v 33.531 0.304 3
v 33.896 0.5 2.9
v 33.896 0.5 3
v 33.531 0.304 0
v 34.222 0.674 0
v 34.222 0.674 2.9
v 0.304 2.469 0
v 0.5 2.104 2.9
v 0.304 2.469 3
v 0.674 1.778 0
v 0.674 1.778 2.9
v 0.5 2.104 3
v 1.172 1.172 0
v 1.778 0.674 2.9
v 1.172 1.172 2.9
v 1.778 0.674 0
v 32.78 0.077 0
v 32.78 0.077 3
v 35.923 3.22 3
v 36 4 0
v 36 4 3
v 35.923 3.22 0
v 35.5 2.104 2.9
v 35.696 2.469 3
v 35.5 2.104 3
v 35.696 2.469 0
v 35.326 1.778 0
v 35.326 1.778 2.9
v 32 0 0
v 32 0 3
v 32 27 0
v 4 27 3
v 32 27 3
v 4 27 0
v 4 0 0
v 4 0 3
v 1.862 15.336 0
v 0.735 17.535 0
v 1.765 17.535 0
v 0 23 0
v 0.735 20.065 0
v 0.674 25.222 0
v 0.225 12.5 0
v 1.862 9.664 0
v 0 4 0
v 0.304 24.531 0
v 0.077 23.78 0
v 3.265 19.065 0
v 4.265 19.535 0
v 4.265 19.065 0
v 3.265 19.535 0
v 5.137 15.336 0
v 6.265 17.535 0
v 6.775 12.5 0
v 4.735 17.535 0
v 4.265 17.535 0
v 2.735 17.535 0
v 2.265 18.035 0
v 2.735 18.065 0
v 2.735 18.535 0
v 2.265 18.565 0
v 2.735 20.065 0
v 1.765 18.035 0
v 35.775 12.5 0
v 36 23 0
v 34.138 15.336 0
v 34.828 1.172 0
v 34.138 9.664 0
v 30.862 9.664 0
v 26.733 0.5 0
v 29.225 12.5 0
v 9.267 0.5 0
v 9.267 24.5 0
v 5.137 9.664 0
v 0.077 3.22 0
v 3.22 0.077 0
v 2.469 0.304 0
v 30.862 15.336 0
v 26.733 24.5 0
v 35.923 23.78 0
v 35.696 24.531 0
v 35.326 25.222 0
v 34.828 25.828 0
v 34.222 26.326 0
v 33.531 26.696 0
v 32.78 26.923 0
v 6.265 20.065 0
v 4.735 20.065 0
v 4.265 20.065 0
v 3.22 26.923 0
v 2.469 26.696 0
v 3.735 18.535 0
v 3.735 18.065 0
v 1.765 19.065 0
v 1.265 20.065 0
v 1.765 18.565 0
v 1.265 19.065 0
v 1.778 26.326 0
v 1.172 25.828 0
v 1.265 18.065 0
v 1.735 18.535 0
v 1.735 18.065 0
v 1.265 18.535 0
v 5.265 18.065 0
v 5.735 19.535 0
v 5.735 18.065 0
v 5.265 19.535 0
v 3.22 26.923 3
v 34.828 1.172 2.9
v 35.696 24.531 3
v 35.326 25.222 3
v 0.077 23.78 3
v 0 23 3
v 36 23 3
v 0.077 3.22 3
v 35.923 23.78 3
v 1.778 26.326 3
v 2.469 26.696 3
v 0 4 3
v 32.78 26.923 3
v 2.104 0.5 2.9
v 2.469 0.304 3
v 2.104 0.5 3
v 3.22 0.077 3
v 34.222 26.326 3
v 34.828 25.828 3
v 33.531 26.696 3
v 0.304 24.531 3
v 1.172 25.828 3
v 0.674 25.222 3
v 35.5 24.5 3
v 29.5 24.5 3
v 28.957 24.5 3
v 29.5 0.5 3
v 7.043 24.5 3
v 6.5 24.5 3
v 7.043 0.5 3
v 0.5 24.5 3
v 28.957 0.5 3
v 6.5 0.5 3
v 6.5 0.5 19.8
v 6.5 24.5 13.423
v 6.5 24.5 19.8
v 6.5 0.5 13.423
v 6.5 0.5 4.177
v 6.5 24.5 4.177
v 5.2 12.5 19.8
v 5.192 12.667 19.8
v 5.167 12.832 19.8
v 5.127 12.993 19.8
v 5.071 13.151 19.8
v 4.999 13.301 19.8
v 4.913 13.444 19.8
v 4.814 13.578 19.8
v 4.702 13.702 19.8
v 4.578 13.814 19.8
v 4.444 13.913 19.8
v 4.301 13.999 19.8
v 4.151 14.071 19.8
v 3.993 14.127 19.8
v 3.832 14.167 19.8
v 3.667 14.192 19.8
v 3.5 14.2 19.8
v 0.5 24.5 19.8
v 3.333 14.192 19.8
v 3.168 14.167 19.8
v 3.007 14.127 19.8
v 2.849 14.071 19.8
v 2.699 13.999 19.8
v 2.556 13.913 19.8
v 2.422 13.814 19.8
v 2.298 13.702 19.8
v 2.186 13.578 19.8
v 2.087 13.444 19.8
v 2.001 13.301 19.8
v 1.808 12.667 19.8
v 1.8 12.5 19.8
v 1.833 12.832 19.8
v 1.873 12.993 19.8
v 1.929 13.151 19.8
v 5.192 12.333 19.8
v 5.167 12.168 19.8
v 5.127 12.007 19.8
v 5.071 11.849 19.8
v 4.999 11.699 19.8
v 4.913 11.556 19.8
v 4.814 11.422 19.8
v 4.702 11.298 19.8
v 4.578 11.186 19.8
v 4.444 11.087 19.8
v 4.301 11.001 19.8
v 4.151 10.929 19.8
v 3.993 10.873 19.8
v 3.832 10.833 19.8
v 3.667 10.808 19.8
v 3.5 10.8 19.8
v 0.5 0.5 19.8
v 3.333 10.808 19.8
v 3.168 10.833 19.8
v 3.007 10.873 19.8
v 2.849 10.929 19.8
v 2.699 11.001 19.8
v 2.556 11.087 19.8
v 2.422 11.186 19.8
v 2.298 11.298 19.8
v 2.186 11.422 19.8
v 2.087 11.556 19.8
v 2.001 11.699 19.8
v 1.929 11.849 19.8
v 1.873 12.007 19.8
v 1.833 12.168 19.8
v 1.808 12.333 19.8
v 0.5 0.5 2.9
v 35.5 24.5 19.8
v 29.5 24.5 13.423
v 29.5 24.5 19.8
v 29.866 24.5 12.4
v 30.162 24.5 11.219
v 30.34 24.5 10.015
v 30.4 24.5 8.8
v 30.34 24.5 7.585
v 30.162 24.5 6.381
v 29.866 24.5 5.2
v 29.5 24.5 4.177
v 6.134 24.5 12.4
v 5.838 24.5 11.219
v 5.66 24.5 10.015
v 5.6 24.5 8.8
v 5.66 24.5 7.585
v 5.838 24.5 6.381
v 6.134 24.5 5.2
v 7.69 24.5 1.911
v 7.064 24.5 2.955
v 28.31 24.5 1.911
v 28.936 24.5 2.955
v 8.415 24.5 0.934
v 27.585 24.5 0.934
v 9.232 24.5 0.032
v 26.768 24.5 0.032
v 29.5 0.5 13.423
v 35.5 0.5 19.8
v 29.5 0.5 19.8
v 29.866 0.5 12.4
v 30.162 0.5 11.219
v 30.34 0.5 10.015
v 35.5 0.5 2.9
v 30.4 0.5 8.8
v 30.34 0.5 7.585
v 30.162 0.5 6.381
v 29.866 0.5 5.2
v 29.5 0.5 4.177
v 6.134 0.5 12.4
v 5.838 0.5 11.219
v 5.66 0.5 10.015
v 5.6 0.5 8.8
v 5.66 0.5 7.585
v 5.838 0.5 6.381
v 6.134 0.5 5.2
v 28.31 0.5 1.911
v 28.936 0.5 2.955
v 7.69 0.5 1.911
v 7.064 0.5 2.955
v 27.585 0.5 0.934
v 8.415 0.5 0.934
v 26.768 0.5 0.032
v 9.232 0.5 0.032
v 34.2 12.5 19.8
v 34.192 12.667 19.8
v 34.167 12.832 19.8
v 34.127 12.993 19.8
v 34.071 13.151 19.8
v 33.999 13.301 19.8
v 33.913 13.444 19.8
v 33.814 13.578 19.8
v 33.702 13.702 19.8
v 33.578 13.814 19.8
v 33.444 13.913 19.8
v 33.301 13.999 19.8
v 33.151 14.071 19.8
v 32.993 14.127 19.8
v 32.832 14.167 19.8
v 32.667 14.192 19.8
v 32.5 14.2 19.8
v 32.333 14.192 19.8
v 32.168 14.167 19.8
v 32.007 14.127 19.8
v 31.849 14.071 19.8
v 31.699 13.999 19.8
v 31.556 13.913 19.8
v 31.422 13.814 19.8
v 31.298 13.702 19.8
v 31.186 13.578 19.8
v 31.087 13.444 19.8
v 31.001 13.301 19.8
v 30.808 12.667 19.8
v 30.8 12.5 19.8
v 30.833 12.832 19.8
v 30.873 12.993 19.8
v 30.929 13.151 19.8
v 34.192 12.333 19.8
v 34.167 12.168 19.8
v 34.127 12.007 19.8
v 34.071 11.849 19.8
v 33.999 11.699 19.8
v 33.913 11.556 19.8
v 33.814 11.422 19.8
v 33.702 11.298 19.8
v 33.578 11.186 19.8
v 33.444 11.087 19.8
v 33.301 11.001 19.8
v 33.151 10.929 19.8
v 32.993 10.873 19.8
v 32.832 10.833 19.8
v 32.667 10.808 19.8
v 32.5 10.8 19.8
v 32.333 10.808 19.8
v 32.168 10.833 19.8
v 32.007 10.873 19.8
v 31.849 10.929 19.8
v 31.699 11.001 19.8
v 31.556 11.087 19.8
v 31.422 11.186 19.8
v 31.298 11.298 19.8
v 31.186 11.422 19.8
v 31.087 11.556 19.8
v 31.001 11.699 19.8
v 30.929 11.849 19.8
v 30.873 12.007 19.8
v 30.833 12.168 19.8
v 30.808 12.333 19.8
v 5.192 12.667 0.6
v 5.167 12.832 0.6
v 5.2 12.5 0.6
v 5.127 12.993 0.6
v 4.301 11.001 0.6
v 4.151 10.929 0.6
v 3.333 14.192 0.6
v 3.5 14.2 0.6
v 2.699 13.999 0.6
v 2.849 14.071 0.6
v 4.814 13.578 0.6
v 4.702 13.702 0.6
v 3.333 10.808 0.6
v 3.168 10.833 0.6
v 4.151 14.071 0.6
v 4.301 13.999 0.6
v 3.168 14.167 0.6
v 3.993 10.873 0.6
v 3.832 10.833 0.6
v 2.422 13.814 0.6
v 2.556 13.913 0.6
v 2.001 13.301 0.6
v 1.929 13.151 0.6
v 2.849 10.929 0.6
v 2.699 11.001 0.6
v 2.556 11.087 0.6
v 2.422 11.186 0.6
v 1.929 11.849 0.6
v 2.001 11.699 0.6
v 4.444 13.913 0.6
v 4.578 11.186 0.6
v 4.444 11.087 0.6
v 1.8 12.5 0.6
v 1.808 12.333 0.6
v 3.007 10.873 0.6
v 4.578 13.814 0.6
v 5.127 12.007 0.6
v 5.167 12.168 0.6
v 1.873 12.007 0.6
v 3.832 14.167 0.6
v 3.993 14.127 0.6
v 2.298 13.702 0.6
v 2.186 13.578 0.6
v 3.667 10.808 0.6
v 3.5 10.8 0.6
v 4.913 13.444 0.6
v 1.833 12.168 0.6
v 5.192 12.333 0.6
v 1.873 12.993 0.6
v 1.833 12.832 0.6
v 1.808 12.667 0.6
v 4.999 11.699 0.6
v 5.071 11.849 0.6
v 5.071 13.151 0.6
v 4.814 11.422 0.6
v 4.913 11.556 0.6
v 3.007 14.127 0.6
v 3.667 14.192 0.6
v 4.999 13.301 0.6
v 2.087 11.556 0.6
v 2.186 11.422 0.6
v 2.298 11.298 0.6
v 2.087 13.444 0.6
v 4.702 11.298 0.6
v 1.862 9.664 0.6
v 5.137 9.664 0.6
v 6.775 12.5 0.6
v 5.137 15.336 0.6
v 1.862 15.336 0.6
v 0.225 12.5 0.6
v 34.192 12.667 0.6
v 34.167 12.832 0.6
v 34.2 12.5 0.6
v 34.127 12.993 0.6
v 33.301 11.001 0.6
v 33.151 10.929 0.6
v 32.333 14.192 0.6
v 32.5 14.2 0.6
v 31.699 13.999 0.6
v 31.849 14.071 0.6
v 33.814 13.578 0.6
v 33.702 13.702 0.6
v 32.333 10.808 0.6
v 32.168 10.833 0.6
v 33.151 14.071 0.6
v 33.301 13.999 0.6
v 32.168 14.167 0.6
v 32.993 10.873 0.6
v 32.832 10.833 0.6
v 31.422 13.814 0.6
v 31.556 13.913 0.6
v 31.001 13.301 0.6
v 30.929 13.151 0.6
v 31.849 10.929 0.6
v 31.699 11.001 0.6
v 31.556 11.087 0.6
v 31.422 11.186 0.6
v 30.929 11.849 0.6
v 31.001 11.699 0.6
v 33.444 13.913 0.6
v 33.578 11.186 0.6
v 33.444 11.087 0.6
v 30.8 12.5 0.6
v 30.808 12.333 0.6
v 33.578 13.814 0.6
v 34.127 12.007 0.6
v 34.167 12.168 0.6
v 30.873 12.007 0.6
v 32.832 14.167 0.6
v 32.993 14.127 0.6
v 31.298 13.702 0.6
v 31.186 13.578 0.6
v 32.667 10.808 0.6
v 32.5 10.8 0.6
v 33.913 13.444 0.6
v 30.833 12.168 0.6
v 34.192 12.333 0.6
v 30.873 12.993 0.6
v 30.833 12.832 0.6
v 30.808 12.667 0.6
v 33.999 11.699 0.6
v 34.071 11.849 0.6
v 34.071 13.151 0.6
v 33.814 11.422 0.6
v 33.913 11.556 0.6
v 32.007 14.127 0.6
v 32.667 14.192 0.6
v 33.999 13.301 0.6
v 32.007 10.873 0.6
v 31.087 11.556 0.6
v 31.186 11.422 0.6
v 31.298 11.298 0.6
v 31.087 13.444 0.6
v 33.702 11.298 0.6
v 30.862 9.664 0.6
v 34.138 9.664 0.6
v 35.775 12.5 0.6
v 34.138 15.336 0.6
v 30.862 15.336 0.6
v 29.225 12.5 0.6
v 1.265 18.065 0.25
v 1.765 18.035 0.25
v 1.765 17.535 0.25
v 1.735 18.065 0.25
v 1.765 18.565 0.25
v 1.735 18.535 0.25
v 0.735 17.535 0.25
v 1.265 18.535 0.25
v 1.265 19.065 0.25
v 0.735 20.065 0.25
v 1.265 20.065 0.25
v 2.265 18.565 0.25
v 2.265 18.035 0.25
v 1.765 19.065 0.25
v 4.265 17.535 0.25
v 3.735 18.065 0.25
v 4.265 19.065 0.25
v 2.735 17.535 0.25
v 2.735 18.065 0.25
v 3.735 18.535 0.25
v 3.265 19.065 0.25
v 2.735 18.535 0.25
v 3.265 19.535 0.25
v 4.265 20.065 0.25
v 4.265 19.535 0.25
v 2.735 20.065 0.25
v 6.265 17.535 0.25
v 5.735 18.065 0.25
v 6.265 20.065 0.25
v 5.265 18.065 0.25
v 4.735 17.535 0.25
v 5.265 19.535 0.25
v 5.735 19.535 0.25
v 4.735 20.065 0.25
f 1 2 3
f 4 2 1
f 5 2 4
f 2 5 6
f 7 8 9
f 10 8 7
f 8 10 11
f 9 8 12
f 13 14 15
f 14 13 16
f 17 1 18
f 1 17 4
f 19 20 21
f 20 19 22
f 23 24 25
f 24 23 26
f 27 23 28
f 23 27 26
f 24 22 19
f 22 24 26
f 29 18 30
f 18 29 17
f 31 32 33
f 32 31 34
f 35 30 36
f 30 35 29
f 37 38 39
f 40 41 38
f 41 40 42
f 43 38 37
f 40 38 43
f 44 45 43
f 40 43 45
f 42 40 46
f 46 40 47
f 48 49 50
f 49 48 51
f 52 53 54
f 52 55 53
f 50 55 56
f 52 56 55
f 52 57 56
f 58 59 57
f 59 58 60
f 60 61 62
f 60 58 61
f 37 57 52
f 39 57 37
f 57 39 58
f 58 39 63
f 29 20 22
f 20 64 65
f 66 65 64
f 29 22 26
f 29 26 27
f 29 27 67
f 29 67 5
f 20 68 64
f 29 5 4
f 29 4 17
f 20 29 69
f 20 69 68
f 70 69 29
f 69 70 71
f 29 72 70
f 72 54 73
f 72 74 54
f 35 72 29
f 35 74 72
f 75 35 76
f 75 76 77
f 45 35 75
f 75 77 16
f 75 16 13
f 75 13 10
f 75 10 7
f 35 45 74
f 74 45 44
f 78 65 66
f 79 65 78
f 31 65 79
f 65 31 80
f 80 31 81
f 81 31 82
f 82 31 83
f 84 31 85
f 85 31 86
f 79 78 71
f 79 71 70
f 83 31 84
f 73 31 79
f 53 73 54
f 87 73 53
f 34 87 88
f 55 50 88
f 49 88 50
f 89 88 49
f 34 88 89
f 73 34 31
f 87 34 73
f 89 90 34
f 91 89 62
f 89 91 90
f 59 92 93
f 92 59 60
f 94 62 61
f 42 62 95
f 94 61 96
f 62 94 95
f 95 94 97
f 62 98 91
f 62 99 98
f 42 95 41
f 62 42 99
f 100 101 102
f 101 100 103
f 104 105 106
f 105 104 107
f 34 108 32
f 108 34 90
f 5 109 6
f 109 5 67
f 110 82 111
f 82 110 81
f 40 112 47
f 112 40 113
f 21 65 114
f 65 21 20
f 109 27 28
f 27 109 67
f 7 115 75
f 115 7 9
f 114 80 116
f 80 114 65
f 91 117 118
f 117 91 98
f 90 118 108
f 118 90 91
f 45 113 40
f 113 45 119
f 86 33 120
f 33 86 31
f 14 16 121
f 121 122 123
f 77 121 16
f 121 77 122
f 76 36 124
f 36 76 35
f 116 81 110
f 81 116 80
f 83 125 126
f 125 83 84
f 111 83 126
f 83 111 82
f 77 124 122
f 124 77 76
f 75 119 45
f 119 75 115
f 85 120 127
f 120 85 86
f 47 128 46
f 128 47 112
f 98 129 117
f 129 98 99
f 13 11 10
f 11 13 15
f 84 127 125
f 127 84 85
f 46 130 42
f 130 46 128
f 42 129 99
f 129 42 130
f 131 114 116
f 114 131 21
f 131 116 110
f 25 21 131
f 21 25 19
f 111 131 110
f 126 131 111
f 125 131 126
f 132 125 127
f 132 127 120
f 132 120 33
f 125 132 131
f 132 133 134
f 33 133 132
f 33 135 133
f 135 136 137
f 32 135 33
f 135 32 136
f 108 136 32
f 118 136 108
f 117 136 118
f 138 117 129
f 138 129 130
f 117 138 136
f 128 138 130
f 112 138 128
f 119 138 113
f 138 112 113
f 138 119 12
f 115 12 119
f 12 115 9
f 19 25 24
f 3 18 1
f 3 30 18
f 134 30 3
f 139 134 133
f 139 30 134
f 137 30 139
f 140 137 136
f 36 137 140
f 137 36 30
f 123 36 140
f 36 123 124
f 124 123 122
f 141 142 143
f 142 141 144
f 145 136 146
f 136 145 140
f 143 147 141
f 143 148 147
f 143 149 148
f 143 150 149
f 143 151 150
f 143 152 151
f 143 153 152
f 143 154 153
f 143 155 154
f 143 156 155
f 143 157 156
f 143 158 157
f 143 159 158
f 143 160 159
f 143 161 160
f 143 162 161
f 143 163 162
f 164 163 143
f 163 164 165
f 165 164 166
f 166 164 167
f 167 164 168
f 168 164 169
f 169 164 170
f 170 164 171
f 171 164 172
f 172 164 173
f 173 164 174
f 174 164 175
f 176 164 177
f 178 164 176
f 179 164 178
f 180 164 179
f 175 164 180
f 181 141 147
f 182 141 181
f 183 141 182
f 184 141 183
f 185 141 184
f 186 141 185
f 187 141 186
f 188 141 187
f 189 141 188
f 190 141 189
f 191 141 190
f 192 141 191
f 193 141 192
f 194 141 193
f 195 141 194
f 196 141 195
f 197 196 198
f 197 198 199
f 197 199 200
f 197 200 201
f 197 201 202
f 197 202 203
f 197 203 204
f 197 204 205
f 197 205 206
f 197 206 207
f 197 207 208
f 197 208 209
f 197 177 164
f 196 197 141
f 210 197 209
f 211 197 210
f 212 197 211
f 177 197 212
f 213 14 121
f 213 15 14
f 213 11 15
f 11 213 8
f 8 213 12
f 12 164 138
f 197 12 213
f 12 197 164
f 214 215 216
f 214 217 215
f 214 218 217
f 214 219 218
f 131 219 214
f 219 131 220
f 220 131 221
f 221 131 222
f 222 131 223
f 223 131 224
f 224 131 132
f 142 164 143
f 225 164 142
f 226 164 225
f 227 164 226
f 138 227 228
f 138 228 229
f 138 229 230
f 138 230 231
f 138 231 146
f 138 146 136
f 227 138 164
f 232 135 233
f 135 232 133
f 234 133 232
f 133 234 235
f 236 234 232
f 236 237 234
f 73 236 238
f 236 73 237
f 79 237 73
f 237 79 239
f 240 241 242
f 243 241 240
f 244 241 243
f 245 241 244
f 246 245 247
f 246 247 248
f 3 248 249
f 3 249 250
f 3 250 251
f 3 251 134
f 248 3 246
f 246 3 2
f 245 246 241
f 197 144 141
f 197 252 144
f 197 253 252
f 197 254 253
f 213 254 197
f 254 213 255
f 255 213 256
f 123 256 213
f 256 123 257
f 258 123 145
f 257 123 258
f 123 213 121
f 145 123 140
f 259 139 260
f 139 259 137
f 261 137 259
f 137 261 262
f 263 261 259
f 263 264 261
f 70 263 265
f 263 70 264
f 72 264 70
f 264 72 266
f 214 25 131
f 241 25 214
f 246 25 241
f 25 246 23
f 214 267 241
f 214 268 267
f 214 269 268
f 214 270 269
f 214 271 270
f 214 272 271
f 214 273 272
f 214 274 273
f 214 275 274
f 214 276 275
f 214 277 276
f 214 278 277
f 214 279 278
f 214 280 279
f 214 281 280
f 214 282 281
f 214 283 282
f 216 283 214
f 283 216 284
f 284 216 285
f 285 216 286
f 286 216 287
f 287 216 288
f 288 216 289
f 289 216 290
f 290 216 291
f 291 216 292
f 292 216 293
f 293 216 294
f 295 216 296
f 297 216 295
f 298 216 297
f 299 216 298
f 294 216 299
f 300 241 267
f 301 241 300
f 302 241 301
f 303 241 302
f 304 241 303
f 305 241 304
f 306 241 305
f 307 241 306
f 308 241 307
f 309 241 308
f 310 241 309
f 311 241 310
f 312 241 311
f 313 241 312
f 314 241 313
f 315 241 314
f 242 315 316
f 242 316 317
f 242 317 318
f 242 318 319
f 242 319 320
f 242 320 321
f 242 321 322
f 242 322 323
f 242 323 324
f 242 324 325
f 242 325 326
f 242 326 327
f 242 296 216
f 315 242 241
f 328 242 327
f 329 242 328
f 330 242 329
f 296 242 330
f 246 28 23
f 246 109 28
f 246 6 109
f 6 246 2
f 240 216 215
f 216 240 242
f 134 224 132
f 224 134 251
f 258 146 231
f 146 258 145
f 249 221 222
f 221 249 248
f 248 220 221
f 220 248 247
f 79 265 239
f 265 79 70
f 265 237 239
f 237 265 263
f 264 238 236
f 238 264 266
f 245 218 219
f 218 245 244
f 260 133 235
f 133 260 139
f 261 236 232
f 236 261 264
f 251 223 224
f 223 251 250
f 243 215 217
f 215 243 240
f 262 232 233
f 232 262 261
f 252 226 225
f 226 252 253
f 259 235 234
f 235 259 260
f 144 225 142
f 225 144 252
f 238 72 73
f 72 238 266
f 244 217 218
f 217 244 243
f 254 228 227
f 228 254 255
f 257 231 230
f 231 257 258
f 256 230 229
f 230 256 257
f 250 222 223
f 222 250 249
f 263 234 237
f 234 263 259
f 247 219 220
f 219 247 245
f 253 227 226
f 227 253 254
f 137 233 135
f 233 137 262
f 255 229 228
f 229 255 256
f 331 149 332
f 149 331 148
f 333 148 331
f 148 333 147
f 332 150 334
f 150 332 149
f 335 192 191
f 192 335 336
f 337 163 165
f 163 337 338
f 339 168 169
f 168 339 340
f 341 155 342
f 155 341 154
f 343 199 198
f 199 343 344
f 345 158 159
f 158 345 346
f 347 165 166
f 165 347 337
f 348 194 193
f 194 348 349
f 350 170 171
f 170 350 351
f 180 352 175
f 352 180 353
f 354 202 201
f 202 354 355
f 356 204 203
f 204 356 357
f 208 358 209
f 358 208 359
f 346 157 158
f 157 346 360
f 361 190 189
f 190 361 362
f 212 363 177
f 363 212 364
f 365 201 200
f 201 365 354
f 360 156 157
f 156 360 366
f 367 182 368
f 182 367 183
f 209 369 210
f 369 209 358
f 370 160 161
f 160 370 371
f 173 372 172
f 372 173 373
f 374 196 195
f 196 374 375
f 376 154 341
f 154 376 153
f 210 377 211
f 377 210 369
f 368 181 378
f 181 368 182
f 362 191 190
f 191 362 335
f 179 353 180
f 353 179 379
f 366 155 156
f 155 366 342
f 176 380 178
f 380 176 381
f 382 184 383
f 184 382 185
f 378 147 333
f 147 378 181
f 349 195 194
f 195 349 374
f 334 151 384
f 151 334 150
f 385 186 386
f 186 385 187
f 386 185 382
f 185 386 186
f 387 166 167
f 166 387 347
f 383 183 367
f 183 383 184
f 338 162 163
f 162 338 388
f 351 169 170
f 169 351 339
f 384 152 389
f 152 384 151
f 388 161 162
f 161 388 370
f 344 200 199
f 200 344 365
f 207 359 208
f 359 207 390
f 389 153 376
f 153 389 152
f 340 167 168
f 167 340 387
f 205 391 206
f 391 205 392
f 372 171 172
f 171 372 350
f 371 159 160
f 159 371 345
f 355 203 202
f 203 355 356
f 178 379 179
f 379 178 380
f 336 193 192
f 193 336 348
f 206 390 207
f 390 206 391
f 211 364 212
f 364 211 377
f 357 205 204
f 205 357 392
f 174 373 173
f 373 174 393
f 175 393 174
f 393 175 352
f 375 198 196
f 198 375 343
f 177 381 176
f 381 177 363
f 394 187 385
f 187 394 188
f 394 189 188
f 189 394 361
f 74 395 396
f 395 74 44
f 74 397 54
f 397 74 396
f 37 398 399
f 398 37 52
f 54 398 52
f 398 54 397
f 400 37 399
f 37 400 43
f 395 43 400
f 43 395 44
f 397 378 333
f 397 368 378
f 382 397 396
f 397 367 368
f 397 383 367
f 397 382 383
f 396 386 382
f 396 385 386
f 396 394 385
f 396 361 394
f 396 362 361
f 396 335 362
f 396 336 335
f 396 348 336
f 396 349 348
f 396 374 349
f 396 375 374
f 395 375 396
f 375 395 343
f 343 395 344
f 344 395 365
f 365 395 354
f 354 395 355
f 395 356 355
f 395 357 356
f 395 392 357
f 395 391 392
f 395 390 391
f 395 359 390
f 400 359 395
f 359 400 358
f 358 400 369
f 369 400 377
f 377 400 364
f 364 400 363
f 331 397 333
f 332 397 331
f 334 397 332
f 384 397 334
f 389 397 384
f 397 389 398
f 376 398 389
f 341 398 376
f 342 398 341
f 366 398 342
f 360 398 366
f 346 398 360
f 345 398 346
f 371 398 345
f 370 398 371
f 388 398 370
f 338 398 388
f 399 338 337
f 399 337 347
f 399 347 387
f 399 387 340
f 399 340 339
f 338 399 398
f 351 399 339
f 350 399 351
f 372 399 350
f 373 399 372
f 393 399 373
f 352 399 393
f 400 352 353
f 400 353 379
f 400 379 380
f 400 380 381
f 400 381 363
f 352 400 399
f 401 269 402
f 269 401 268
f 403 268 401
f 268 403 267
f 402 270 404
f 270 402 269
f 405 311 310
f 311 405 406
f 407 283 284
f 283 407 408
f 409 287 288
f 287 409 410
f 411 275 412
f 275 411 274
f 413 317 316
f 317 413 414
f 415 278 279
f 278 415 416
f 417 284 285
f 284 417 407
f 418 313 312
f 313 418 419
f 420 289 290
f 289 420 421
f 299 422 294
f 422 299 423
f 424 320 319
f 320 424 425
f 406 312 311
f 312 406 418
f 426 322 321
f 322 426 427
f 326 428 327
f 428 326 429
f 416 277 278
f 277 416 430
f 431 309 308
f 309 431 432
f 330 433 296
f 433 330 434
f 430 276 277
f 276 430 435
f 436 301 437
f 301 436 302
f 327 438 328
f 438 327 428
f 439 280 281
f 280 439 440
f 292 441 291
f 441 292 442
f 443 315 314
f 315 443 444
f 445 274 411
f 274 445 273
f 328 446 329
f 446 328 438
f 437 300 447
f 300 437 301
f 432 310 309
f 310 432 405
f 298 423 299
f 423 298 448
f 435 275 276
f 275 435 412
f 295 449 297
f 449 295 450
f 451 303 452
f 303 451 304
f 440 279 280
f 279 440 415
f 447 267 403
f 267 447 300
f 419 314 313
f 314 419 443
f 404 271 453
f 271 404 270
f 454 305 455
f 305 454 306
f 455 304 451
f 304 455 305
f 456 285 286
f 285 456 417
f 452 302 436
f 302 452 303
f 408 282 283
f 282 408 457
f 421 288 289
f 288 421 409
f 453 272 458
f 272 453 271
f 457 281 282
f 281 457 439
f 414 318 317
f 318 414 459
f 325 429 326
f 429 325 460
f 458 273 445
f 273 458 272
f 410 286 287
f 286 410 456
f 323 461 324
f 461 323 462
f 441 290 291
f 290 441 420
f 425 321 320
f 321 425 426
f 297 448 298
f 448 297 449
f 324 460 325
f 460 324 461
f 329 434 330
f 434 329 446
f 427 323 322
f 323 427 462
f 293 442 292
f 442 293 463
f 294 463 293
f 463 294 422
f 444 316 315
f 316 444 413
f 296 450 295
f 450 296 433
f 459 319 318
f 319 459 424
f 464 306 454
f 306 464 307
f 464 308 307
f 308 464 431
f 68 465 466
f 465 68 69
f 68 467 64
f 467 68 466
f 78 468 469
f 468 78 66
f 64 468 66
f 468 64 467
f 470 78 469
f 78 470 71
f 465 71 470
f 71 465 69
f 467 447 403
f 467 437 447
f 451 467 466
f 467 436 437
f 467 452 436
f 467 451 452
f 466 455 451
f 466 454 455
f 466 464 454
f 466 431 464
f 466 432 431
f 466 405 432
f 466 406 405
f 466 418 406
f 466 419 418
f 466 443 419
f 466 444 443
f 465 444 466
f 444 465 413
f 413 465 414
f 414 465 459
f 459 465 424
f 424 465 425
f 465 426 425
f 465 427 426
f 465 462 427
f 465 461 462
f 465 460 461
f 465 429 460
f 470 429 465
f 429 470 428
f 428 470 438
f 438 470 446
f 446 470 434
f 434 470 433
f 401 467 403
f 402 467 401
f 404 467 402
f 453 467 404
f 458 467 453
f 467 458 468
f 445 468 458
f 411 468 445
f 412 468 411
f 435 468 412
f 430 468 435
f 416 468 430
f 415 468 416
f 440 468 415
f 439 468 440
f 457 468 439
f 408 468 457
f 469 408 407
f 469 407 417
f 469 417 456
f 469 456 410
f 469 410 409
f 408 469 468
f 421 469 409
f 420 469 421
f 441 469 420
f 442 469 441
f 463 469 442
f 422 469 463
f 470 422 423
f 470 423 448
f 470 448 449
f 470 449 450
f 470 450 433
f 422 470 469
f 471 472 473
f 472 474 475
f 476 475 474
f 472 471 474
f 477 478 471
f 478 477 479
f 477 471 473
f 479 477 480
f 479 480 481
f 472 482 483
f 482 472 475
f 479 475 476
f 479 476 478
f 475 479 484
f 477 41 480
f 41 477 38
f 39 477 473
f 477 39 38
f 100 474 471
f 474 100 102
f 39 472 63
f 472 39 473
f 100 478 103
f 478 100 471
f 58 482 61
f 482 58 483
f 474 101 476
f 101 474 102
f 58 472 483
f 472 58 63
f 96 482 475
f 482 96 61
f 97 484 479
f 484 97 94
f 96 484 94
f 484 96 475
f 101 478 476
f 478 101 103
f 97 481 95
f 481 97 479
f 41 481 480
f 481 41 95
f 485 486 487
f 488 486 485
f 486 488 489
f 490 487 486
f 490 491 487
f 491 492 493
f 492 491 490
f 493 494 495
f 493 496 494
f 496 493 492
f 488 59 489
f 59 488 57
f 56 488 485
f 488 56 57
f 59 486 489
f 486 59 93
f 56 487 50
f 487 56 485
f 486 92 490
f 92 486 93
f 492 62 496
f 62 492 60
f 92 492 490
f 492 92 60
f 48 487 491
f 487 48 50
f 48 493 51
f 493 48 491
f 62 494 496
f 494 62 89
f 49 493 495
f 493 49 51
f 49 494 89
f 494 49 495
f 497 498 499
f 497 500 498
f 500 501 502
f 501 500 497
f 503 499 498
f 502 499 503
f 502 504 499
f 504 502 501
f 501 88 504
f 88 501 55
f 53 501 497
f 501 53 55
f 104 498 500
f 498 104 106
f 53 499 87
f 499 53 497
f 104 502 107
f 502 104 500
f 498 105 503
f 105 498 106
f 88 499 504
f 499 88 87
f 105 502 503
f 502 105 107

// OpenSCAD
// RF300出牌馬達底座
$fn=64;
translate([-43,86.8,-45.4]){rotate([0,0,0]){difference(){translate([0,-14.3,0]){difference(){difference(){difference(){difference(){difference(){union(){union(){translate([61,-59,0]){translate([0,0,45.4]){linear_extrude(height=3)polygon([[18,9.5],[17.92314,10.28036],[17.69552,11.03073],[17.32588,11.72228],[16.82843,12.32843],[16.22228,12.82588],[15.53073,13.19552],[14.78036,13.42314],[14,13.5],[-14,13.5],[-14.78036,13.42314],[-15.53073,13.19552],[-16.22228,12.82588],[-16.82843,12.32843],[-17.32588,11.72228],[-17.69552,11.03073],[-17.92314,10.28036],[-18,9.5],[-18,-9.5],[-17.92314,-10.28036],[-17.69552,-11.03073],[-17.32588,-11.72228],[-16.82843,-12.32843],[-16.22228,-12.82588],[-15.53073,-13.19552],[-14.78036,-13.42314],[-14,-13.5],[14,-13.5],[14.78036,-13.42314],[15.53073,-13.19552],[16.22228,-12.82588],[16.82843,-12.32843],[17.32588,-11.72228],[17.69552,-11.03073],[17.92314,-10.28036],[18,-9.5]]);}}translate([43.5,-72,48.3]){cube([6,24,16.9]);}}translate([72.5,-72,48.3]){cube([6,24,16.9]);}}translate([61,-72,54.2]){rotate([-90,0,0]){translate([0,0,0]){cylinder(h=24,d1=24.8,d2=24.8,$fn=64);}}}}translate([46.5,-60,43]){cylinder(h=27,d1=3.4,d2=3.4,$fn=64);}}translate([46.5,-60,43.4]){cylinder(h=2.6,d1=6.55,d2=6.55,$fn=6);}}translate([75.5,-60,43]){cylinder(h=27,d1=3.4,d2=3.4,$fn=64);}}translate([75.5,-60,43.4]){cylinder(h=2.6,d1=6.55,d2=6.55,$fn=6);}}}multmatrix([[1,0,0,46.5],[0,-1,0,-68],[0,0,-1,45.4],[0,0,0,1]]){union(){union(){union(){union(){union(){union(){union(){union(){union(){union(){union(){union(){union(){union(){union(){union(){union(){union(){union(){union(){union(){union(){union(){union(){union(){union(){union(){union(){union(){union(){translate([-2.765,0.735,-0.25]){cube([0.53,0.53,0.37]);}translate([-2.265,0.735,-0.25]){cube([0.53,0.53,0.37]);}}translate([-2.765,0.235,-0.25]){cube([0.53,0.53,0.37]);}}translate([-1.765,0.235,-0.25]){cube([0.53,0.53,0.37]);}}translate([-2.765,-0.265,-0.25]){cube([0.53,0.53,0.37]);}}translate([-2.265,-0.265,-0.25]){cube([0.53,0.53,0.37]);}}translate([-2.765,-0.765,-0.25]){cube([0.53,0.53,0.37]);}}translate([-2.765,-1.265,-0.25]){cube([0.53,0.53,0.37]);}}translate([-0.765,0.735,-0.25]){cube([0.53,0.53,0.37]);}}translate([-0.265,0.735,-0.25]){cube([0.53,0.53,0.37]);}}translate([0.235,0.735,-0.25]){cube([0.53,0.53,0.37]);}}translate([0.235,0.235,-0.25]){cube([0.53,0.53,0.37]);}}translate([-0.765,-0.265,-0.25]){cube([0.53,0.53,0.37]);}}translate([-0.265,-0.265,-0.25]){cube([0.53,0.53,0.37]);}}translate([0.235,-0.265,-0.25]){cube([0.53,0.53,0.37]);}}translate([-0.765,-0.765,-0.25]){cube([0.53,0.53,0.37]);}}translate([-0.765,-1.265,-0.25]){cube([0.53,0.53,0.37]);}}translate([-0.265,-1.265,-0.25]){cube([0.53,0.53,0.37]);}}translate([0.235,-1.265,-0.25]){cube([0.53,0.53,0.37]);}}translate([1.235,0.735,-0.25]){cube([0.53,0.53,0.37]);}}translate([1.735,0.735,-0.25]){cube([0.53,0.53,0.37]);}}translate([2.235,0.735,-0.25]){cube([0.53,0.53,0.37]);}}translate([1.235,0.235,-0.25]){cube([0.53,0.53,0.37]);}}translate([2.235,0.235,-0.25]){cube([0.53,0.53,0.37]);}}translate([1.235,-0.265,-0.25]){cube([0.53,0.53,0.37]);}}translate([2.235,-0.265,-0.25]){cube([0.53,0.53,0.37]);}}translate([1.235,-0.765,-0.25]){cube([0.53,0.53,0.37]);}}translate([2.235,-0.765,-0.25]){cube([0.53,0.53,0.37]);}}translate([1.235,-1.265,-0.25]){cube([0.53,0.53,0.37]);}}translate([1.735,-1.265,-0.25]){cube([0.53,0.53,0.37]);}}translate([2.235,-1.265,-0.25]){cube([0.53,0.53,0.37]);}}}}}}
